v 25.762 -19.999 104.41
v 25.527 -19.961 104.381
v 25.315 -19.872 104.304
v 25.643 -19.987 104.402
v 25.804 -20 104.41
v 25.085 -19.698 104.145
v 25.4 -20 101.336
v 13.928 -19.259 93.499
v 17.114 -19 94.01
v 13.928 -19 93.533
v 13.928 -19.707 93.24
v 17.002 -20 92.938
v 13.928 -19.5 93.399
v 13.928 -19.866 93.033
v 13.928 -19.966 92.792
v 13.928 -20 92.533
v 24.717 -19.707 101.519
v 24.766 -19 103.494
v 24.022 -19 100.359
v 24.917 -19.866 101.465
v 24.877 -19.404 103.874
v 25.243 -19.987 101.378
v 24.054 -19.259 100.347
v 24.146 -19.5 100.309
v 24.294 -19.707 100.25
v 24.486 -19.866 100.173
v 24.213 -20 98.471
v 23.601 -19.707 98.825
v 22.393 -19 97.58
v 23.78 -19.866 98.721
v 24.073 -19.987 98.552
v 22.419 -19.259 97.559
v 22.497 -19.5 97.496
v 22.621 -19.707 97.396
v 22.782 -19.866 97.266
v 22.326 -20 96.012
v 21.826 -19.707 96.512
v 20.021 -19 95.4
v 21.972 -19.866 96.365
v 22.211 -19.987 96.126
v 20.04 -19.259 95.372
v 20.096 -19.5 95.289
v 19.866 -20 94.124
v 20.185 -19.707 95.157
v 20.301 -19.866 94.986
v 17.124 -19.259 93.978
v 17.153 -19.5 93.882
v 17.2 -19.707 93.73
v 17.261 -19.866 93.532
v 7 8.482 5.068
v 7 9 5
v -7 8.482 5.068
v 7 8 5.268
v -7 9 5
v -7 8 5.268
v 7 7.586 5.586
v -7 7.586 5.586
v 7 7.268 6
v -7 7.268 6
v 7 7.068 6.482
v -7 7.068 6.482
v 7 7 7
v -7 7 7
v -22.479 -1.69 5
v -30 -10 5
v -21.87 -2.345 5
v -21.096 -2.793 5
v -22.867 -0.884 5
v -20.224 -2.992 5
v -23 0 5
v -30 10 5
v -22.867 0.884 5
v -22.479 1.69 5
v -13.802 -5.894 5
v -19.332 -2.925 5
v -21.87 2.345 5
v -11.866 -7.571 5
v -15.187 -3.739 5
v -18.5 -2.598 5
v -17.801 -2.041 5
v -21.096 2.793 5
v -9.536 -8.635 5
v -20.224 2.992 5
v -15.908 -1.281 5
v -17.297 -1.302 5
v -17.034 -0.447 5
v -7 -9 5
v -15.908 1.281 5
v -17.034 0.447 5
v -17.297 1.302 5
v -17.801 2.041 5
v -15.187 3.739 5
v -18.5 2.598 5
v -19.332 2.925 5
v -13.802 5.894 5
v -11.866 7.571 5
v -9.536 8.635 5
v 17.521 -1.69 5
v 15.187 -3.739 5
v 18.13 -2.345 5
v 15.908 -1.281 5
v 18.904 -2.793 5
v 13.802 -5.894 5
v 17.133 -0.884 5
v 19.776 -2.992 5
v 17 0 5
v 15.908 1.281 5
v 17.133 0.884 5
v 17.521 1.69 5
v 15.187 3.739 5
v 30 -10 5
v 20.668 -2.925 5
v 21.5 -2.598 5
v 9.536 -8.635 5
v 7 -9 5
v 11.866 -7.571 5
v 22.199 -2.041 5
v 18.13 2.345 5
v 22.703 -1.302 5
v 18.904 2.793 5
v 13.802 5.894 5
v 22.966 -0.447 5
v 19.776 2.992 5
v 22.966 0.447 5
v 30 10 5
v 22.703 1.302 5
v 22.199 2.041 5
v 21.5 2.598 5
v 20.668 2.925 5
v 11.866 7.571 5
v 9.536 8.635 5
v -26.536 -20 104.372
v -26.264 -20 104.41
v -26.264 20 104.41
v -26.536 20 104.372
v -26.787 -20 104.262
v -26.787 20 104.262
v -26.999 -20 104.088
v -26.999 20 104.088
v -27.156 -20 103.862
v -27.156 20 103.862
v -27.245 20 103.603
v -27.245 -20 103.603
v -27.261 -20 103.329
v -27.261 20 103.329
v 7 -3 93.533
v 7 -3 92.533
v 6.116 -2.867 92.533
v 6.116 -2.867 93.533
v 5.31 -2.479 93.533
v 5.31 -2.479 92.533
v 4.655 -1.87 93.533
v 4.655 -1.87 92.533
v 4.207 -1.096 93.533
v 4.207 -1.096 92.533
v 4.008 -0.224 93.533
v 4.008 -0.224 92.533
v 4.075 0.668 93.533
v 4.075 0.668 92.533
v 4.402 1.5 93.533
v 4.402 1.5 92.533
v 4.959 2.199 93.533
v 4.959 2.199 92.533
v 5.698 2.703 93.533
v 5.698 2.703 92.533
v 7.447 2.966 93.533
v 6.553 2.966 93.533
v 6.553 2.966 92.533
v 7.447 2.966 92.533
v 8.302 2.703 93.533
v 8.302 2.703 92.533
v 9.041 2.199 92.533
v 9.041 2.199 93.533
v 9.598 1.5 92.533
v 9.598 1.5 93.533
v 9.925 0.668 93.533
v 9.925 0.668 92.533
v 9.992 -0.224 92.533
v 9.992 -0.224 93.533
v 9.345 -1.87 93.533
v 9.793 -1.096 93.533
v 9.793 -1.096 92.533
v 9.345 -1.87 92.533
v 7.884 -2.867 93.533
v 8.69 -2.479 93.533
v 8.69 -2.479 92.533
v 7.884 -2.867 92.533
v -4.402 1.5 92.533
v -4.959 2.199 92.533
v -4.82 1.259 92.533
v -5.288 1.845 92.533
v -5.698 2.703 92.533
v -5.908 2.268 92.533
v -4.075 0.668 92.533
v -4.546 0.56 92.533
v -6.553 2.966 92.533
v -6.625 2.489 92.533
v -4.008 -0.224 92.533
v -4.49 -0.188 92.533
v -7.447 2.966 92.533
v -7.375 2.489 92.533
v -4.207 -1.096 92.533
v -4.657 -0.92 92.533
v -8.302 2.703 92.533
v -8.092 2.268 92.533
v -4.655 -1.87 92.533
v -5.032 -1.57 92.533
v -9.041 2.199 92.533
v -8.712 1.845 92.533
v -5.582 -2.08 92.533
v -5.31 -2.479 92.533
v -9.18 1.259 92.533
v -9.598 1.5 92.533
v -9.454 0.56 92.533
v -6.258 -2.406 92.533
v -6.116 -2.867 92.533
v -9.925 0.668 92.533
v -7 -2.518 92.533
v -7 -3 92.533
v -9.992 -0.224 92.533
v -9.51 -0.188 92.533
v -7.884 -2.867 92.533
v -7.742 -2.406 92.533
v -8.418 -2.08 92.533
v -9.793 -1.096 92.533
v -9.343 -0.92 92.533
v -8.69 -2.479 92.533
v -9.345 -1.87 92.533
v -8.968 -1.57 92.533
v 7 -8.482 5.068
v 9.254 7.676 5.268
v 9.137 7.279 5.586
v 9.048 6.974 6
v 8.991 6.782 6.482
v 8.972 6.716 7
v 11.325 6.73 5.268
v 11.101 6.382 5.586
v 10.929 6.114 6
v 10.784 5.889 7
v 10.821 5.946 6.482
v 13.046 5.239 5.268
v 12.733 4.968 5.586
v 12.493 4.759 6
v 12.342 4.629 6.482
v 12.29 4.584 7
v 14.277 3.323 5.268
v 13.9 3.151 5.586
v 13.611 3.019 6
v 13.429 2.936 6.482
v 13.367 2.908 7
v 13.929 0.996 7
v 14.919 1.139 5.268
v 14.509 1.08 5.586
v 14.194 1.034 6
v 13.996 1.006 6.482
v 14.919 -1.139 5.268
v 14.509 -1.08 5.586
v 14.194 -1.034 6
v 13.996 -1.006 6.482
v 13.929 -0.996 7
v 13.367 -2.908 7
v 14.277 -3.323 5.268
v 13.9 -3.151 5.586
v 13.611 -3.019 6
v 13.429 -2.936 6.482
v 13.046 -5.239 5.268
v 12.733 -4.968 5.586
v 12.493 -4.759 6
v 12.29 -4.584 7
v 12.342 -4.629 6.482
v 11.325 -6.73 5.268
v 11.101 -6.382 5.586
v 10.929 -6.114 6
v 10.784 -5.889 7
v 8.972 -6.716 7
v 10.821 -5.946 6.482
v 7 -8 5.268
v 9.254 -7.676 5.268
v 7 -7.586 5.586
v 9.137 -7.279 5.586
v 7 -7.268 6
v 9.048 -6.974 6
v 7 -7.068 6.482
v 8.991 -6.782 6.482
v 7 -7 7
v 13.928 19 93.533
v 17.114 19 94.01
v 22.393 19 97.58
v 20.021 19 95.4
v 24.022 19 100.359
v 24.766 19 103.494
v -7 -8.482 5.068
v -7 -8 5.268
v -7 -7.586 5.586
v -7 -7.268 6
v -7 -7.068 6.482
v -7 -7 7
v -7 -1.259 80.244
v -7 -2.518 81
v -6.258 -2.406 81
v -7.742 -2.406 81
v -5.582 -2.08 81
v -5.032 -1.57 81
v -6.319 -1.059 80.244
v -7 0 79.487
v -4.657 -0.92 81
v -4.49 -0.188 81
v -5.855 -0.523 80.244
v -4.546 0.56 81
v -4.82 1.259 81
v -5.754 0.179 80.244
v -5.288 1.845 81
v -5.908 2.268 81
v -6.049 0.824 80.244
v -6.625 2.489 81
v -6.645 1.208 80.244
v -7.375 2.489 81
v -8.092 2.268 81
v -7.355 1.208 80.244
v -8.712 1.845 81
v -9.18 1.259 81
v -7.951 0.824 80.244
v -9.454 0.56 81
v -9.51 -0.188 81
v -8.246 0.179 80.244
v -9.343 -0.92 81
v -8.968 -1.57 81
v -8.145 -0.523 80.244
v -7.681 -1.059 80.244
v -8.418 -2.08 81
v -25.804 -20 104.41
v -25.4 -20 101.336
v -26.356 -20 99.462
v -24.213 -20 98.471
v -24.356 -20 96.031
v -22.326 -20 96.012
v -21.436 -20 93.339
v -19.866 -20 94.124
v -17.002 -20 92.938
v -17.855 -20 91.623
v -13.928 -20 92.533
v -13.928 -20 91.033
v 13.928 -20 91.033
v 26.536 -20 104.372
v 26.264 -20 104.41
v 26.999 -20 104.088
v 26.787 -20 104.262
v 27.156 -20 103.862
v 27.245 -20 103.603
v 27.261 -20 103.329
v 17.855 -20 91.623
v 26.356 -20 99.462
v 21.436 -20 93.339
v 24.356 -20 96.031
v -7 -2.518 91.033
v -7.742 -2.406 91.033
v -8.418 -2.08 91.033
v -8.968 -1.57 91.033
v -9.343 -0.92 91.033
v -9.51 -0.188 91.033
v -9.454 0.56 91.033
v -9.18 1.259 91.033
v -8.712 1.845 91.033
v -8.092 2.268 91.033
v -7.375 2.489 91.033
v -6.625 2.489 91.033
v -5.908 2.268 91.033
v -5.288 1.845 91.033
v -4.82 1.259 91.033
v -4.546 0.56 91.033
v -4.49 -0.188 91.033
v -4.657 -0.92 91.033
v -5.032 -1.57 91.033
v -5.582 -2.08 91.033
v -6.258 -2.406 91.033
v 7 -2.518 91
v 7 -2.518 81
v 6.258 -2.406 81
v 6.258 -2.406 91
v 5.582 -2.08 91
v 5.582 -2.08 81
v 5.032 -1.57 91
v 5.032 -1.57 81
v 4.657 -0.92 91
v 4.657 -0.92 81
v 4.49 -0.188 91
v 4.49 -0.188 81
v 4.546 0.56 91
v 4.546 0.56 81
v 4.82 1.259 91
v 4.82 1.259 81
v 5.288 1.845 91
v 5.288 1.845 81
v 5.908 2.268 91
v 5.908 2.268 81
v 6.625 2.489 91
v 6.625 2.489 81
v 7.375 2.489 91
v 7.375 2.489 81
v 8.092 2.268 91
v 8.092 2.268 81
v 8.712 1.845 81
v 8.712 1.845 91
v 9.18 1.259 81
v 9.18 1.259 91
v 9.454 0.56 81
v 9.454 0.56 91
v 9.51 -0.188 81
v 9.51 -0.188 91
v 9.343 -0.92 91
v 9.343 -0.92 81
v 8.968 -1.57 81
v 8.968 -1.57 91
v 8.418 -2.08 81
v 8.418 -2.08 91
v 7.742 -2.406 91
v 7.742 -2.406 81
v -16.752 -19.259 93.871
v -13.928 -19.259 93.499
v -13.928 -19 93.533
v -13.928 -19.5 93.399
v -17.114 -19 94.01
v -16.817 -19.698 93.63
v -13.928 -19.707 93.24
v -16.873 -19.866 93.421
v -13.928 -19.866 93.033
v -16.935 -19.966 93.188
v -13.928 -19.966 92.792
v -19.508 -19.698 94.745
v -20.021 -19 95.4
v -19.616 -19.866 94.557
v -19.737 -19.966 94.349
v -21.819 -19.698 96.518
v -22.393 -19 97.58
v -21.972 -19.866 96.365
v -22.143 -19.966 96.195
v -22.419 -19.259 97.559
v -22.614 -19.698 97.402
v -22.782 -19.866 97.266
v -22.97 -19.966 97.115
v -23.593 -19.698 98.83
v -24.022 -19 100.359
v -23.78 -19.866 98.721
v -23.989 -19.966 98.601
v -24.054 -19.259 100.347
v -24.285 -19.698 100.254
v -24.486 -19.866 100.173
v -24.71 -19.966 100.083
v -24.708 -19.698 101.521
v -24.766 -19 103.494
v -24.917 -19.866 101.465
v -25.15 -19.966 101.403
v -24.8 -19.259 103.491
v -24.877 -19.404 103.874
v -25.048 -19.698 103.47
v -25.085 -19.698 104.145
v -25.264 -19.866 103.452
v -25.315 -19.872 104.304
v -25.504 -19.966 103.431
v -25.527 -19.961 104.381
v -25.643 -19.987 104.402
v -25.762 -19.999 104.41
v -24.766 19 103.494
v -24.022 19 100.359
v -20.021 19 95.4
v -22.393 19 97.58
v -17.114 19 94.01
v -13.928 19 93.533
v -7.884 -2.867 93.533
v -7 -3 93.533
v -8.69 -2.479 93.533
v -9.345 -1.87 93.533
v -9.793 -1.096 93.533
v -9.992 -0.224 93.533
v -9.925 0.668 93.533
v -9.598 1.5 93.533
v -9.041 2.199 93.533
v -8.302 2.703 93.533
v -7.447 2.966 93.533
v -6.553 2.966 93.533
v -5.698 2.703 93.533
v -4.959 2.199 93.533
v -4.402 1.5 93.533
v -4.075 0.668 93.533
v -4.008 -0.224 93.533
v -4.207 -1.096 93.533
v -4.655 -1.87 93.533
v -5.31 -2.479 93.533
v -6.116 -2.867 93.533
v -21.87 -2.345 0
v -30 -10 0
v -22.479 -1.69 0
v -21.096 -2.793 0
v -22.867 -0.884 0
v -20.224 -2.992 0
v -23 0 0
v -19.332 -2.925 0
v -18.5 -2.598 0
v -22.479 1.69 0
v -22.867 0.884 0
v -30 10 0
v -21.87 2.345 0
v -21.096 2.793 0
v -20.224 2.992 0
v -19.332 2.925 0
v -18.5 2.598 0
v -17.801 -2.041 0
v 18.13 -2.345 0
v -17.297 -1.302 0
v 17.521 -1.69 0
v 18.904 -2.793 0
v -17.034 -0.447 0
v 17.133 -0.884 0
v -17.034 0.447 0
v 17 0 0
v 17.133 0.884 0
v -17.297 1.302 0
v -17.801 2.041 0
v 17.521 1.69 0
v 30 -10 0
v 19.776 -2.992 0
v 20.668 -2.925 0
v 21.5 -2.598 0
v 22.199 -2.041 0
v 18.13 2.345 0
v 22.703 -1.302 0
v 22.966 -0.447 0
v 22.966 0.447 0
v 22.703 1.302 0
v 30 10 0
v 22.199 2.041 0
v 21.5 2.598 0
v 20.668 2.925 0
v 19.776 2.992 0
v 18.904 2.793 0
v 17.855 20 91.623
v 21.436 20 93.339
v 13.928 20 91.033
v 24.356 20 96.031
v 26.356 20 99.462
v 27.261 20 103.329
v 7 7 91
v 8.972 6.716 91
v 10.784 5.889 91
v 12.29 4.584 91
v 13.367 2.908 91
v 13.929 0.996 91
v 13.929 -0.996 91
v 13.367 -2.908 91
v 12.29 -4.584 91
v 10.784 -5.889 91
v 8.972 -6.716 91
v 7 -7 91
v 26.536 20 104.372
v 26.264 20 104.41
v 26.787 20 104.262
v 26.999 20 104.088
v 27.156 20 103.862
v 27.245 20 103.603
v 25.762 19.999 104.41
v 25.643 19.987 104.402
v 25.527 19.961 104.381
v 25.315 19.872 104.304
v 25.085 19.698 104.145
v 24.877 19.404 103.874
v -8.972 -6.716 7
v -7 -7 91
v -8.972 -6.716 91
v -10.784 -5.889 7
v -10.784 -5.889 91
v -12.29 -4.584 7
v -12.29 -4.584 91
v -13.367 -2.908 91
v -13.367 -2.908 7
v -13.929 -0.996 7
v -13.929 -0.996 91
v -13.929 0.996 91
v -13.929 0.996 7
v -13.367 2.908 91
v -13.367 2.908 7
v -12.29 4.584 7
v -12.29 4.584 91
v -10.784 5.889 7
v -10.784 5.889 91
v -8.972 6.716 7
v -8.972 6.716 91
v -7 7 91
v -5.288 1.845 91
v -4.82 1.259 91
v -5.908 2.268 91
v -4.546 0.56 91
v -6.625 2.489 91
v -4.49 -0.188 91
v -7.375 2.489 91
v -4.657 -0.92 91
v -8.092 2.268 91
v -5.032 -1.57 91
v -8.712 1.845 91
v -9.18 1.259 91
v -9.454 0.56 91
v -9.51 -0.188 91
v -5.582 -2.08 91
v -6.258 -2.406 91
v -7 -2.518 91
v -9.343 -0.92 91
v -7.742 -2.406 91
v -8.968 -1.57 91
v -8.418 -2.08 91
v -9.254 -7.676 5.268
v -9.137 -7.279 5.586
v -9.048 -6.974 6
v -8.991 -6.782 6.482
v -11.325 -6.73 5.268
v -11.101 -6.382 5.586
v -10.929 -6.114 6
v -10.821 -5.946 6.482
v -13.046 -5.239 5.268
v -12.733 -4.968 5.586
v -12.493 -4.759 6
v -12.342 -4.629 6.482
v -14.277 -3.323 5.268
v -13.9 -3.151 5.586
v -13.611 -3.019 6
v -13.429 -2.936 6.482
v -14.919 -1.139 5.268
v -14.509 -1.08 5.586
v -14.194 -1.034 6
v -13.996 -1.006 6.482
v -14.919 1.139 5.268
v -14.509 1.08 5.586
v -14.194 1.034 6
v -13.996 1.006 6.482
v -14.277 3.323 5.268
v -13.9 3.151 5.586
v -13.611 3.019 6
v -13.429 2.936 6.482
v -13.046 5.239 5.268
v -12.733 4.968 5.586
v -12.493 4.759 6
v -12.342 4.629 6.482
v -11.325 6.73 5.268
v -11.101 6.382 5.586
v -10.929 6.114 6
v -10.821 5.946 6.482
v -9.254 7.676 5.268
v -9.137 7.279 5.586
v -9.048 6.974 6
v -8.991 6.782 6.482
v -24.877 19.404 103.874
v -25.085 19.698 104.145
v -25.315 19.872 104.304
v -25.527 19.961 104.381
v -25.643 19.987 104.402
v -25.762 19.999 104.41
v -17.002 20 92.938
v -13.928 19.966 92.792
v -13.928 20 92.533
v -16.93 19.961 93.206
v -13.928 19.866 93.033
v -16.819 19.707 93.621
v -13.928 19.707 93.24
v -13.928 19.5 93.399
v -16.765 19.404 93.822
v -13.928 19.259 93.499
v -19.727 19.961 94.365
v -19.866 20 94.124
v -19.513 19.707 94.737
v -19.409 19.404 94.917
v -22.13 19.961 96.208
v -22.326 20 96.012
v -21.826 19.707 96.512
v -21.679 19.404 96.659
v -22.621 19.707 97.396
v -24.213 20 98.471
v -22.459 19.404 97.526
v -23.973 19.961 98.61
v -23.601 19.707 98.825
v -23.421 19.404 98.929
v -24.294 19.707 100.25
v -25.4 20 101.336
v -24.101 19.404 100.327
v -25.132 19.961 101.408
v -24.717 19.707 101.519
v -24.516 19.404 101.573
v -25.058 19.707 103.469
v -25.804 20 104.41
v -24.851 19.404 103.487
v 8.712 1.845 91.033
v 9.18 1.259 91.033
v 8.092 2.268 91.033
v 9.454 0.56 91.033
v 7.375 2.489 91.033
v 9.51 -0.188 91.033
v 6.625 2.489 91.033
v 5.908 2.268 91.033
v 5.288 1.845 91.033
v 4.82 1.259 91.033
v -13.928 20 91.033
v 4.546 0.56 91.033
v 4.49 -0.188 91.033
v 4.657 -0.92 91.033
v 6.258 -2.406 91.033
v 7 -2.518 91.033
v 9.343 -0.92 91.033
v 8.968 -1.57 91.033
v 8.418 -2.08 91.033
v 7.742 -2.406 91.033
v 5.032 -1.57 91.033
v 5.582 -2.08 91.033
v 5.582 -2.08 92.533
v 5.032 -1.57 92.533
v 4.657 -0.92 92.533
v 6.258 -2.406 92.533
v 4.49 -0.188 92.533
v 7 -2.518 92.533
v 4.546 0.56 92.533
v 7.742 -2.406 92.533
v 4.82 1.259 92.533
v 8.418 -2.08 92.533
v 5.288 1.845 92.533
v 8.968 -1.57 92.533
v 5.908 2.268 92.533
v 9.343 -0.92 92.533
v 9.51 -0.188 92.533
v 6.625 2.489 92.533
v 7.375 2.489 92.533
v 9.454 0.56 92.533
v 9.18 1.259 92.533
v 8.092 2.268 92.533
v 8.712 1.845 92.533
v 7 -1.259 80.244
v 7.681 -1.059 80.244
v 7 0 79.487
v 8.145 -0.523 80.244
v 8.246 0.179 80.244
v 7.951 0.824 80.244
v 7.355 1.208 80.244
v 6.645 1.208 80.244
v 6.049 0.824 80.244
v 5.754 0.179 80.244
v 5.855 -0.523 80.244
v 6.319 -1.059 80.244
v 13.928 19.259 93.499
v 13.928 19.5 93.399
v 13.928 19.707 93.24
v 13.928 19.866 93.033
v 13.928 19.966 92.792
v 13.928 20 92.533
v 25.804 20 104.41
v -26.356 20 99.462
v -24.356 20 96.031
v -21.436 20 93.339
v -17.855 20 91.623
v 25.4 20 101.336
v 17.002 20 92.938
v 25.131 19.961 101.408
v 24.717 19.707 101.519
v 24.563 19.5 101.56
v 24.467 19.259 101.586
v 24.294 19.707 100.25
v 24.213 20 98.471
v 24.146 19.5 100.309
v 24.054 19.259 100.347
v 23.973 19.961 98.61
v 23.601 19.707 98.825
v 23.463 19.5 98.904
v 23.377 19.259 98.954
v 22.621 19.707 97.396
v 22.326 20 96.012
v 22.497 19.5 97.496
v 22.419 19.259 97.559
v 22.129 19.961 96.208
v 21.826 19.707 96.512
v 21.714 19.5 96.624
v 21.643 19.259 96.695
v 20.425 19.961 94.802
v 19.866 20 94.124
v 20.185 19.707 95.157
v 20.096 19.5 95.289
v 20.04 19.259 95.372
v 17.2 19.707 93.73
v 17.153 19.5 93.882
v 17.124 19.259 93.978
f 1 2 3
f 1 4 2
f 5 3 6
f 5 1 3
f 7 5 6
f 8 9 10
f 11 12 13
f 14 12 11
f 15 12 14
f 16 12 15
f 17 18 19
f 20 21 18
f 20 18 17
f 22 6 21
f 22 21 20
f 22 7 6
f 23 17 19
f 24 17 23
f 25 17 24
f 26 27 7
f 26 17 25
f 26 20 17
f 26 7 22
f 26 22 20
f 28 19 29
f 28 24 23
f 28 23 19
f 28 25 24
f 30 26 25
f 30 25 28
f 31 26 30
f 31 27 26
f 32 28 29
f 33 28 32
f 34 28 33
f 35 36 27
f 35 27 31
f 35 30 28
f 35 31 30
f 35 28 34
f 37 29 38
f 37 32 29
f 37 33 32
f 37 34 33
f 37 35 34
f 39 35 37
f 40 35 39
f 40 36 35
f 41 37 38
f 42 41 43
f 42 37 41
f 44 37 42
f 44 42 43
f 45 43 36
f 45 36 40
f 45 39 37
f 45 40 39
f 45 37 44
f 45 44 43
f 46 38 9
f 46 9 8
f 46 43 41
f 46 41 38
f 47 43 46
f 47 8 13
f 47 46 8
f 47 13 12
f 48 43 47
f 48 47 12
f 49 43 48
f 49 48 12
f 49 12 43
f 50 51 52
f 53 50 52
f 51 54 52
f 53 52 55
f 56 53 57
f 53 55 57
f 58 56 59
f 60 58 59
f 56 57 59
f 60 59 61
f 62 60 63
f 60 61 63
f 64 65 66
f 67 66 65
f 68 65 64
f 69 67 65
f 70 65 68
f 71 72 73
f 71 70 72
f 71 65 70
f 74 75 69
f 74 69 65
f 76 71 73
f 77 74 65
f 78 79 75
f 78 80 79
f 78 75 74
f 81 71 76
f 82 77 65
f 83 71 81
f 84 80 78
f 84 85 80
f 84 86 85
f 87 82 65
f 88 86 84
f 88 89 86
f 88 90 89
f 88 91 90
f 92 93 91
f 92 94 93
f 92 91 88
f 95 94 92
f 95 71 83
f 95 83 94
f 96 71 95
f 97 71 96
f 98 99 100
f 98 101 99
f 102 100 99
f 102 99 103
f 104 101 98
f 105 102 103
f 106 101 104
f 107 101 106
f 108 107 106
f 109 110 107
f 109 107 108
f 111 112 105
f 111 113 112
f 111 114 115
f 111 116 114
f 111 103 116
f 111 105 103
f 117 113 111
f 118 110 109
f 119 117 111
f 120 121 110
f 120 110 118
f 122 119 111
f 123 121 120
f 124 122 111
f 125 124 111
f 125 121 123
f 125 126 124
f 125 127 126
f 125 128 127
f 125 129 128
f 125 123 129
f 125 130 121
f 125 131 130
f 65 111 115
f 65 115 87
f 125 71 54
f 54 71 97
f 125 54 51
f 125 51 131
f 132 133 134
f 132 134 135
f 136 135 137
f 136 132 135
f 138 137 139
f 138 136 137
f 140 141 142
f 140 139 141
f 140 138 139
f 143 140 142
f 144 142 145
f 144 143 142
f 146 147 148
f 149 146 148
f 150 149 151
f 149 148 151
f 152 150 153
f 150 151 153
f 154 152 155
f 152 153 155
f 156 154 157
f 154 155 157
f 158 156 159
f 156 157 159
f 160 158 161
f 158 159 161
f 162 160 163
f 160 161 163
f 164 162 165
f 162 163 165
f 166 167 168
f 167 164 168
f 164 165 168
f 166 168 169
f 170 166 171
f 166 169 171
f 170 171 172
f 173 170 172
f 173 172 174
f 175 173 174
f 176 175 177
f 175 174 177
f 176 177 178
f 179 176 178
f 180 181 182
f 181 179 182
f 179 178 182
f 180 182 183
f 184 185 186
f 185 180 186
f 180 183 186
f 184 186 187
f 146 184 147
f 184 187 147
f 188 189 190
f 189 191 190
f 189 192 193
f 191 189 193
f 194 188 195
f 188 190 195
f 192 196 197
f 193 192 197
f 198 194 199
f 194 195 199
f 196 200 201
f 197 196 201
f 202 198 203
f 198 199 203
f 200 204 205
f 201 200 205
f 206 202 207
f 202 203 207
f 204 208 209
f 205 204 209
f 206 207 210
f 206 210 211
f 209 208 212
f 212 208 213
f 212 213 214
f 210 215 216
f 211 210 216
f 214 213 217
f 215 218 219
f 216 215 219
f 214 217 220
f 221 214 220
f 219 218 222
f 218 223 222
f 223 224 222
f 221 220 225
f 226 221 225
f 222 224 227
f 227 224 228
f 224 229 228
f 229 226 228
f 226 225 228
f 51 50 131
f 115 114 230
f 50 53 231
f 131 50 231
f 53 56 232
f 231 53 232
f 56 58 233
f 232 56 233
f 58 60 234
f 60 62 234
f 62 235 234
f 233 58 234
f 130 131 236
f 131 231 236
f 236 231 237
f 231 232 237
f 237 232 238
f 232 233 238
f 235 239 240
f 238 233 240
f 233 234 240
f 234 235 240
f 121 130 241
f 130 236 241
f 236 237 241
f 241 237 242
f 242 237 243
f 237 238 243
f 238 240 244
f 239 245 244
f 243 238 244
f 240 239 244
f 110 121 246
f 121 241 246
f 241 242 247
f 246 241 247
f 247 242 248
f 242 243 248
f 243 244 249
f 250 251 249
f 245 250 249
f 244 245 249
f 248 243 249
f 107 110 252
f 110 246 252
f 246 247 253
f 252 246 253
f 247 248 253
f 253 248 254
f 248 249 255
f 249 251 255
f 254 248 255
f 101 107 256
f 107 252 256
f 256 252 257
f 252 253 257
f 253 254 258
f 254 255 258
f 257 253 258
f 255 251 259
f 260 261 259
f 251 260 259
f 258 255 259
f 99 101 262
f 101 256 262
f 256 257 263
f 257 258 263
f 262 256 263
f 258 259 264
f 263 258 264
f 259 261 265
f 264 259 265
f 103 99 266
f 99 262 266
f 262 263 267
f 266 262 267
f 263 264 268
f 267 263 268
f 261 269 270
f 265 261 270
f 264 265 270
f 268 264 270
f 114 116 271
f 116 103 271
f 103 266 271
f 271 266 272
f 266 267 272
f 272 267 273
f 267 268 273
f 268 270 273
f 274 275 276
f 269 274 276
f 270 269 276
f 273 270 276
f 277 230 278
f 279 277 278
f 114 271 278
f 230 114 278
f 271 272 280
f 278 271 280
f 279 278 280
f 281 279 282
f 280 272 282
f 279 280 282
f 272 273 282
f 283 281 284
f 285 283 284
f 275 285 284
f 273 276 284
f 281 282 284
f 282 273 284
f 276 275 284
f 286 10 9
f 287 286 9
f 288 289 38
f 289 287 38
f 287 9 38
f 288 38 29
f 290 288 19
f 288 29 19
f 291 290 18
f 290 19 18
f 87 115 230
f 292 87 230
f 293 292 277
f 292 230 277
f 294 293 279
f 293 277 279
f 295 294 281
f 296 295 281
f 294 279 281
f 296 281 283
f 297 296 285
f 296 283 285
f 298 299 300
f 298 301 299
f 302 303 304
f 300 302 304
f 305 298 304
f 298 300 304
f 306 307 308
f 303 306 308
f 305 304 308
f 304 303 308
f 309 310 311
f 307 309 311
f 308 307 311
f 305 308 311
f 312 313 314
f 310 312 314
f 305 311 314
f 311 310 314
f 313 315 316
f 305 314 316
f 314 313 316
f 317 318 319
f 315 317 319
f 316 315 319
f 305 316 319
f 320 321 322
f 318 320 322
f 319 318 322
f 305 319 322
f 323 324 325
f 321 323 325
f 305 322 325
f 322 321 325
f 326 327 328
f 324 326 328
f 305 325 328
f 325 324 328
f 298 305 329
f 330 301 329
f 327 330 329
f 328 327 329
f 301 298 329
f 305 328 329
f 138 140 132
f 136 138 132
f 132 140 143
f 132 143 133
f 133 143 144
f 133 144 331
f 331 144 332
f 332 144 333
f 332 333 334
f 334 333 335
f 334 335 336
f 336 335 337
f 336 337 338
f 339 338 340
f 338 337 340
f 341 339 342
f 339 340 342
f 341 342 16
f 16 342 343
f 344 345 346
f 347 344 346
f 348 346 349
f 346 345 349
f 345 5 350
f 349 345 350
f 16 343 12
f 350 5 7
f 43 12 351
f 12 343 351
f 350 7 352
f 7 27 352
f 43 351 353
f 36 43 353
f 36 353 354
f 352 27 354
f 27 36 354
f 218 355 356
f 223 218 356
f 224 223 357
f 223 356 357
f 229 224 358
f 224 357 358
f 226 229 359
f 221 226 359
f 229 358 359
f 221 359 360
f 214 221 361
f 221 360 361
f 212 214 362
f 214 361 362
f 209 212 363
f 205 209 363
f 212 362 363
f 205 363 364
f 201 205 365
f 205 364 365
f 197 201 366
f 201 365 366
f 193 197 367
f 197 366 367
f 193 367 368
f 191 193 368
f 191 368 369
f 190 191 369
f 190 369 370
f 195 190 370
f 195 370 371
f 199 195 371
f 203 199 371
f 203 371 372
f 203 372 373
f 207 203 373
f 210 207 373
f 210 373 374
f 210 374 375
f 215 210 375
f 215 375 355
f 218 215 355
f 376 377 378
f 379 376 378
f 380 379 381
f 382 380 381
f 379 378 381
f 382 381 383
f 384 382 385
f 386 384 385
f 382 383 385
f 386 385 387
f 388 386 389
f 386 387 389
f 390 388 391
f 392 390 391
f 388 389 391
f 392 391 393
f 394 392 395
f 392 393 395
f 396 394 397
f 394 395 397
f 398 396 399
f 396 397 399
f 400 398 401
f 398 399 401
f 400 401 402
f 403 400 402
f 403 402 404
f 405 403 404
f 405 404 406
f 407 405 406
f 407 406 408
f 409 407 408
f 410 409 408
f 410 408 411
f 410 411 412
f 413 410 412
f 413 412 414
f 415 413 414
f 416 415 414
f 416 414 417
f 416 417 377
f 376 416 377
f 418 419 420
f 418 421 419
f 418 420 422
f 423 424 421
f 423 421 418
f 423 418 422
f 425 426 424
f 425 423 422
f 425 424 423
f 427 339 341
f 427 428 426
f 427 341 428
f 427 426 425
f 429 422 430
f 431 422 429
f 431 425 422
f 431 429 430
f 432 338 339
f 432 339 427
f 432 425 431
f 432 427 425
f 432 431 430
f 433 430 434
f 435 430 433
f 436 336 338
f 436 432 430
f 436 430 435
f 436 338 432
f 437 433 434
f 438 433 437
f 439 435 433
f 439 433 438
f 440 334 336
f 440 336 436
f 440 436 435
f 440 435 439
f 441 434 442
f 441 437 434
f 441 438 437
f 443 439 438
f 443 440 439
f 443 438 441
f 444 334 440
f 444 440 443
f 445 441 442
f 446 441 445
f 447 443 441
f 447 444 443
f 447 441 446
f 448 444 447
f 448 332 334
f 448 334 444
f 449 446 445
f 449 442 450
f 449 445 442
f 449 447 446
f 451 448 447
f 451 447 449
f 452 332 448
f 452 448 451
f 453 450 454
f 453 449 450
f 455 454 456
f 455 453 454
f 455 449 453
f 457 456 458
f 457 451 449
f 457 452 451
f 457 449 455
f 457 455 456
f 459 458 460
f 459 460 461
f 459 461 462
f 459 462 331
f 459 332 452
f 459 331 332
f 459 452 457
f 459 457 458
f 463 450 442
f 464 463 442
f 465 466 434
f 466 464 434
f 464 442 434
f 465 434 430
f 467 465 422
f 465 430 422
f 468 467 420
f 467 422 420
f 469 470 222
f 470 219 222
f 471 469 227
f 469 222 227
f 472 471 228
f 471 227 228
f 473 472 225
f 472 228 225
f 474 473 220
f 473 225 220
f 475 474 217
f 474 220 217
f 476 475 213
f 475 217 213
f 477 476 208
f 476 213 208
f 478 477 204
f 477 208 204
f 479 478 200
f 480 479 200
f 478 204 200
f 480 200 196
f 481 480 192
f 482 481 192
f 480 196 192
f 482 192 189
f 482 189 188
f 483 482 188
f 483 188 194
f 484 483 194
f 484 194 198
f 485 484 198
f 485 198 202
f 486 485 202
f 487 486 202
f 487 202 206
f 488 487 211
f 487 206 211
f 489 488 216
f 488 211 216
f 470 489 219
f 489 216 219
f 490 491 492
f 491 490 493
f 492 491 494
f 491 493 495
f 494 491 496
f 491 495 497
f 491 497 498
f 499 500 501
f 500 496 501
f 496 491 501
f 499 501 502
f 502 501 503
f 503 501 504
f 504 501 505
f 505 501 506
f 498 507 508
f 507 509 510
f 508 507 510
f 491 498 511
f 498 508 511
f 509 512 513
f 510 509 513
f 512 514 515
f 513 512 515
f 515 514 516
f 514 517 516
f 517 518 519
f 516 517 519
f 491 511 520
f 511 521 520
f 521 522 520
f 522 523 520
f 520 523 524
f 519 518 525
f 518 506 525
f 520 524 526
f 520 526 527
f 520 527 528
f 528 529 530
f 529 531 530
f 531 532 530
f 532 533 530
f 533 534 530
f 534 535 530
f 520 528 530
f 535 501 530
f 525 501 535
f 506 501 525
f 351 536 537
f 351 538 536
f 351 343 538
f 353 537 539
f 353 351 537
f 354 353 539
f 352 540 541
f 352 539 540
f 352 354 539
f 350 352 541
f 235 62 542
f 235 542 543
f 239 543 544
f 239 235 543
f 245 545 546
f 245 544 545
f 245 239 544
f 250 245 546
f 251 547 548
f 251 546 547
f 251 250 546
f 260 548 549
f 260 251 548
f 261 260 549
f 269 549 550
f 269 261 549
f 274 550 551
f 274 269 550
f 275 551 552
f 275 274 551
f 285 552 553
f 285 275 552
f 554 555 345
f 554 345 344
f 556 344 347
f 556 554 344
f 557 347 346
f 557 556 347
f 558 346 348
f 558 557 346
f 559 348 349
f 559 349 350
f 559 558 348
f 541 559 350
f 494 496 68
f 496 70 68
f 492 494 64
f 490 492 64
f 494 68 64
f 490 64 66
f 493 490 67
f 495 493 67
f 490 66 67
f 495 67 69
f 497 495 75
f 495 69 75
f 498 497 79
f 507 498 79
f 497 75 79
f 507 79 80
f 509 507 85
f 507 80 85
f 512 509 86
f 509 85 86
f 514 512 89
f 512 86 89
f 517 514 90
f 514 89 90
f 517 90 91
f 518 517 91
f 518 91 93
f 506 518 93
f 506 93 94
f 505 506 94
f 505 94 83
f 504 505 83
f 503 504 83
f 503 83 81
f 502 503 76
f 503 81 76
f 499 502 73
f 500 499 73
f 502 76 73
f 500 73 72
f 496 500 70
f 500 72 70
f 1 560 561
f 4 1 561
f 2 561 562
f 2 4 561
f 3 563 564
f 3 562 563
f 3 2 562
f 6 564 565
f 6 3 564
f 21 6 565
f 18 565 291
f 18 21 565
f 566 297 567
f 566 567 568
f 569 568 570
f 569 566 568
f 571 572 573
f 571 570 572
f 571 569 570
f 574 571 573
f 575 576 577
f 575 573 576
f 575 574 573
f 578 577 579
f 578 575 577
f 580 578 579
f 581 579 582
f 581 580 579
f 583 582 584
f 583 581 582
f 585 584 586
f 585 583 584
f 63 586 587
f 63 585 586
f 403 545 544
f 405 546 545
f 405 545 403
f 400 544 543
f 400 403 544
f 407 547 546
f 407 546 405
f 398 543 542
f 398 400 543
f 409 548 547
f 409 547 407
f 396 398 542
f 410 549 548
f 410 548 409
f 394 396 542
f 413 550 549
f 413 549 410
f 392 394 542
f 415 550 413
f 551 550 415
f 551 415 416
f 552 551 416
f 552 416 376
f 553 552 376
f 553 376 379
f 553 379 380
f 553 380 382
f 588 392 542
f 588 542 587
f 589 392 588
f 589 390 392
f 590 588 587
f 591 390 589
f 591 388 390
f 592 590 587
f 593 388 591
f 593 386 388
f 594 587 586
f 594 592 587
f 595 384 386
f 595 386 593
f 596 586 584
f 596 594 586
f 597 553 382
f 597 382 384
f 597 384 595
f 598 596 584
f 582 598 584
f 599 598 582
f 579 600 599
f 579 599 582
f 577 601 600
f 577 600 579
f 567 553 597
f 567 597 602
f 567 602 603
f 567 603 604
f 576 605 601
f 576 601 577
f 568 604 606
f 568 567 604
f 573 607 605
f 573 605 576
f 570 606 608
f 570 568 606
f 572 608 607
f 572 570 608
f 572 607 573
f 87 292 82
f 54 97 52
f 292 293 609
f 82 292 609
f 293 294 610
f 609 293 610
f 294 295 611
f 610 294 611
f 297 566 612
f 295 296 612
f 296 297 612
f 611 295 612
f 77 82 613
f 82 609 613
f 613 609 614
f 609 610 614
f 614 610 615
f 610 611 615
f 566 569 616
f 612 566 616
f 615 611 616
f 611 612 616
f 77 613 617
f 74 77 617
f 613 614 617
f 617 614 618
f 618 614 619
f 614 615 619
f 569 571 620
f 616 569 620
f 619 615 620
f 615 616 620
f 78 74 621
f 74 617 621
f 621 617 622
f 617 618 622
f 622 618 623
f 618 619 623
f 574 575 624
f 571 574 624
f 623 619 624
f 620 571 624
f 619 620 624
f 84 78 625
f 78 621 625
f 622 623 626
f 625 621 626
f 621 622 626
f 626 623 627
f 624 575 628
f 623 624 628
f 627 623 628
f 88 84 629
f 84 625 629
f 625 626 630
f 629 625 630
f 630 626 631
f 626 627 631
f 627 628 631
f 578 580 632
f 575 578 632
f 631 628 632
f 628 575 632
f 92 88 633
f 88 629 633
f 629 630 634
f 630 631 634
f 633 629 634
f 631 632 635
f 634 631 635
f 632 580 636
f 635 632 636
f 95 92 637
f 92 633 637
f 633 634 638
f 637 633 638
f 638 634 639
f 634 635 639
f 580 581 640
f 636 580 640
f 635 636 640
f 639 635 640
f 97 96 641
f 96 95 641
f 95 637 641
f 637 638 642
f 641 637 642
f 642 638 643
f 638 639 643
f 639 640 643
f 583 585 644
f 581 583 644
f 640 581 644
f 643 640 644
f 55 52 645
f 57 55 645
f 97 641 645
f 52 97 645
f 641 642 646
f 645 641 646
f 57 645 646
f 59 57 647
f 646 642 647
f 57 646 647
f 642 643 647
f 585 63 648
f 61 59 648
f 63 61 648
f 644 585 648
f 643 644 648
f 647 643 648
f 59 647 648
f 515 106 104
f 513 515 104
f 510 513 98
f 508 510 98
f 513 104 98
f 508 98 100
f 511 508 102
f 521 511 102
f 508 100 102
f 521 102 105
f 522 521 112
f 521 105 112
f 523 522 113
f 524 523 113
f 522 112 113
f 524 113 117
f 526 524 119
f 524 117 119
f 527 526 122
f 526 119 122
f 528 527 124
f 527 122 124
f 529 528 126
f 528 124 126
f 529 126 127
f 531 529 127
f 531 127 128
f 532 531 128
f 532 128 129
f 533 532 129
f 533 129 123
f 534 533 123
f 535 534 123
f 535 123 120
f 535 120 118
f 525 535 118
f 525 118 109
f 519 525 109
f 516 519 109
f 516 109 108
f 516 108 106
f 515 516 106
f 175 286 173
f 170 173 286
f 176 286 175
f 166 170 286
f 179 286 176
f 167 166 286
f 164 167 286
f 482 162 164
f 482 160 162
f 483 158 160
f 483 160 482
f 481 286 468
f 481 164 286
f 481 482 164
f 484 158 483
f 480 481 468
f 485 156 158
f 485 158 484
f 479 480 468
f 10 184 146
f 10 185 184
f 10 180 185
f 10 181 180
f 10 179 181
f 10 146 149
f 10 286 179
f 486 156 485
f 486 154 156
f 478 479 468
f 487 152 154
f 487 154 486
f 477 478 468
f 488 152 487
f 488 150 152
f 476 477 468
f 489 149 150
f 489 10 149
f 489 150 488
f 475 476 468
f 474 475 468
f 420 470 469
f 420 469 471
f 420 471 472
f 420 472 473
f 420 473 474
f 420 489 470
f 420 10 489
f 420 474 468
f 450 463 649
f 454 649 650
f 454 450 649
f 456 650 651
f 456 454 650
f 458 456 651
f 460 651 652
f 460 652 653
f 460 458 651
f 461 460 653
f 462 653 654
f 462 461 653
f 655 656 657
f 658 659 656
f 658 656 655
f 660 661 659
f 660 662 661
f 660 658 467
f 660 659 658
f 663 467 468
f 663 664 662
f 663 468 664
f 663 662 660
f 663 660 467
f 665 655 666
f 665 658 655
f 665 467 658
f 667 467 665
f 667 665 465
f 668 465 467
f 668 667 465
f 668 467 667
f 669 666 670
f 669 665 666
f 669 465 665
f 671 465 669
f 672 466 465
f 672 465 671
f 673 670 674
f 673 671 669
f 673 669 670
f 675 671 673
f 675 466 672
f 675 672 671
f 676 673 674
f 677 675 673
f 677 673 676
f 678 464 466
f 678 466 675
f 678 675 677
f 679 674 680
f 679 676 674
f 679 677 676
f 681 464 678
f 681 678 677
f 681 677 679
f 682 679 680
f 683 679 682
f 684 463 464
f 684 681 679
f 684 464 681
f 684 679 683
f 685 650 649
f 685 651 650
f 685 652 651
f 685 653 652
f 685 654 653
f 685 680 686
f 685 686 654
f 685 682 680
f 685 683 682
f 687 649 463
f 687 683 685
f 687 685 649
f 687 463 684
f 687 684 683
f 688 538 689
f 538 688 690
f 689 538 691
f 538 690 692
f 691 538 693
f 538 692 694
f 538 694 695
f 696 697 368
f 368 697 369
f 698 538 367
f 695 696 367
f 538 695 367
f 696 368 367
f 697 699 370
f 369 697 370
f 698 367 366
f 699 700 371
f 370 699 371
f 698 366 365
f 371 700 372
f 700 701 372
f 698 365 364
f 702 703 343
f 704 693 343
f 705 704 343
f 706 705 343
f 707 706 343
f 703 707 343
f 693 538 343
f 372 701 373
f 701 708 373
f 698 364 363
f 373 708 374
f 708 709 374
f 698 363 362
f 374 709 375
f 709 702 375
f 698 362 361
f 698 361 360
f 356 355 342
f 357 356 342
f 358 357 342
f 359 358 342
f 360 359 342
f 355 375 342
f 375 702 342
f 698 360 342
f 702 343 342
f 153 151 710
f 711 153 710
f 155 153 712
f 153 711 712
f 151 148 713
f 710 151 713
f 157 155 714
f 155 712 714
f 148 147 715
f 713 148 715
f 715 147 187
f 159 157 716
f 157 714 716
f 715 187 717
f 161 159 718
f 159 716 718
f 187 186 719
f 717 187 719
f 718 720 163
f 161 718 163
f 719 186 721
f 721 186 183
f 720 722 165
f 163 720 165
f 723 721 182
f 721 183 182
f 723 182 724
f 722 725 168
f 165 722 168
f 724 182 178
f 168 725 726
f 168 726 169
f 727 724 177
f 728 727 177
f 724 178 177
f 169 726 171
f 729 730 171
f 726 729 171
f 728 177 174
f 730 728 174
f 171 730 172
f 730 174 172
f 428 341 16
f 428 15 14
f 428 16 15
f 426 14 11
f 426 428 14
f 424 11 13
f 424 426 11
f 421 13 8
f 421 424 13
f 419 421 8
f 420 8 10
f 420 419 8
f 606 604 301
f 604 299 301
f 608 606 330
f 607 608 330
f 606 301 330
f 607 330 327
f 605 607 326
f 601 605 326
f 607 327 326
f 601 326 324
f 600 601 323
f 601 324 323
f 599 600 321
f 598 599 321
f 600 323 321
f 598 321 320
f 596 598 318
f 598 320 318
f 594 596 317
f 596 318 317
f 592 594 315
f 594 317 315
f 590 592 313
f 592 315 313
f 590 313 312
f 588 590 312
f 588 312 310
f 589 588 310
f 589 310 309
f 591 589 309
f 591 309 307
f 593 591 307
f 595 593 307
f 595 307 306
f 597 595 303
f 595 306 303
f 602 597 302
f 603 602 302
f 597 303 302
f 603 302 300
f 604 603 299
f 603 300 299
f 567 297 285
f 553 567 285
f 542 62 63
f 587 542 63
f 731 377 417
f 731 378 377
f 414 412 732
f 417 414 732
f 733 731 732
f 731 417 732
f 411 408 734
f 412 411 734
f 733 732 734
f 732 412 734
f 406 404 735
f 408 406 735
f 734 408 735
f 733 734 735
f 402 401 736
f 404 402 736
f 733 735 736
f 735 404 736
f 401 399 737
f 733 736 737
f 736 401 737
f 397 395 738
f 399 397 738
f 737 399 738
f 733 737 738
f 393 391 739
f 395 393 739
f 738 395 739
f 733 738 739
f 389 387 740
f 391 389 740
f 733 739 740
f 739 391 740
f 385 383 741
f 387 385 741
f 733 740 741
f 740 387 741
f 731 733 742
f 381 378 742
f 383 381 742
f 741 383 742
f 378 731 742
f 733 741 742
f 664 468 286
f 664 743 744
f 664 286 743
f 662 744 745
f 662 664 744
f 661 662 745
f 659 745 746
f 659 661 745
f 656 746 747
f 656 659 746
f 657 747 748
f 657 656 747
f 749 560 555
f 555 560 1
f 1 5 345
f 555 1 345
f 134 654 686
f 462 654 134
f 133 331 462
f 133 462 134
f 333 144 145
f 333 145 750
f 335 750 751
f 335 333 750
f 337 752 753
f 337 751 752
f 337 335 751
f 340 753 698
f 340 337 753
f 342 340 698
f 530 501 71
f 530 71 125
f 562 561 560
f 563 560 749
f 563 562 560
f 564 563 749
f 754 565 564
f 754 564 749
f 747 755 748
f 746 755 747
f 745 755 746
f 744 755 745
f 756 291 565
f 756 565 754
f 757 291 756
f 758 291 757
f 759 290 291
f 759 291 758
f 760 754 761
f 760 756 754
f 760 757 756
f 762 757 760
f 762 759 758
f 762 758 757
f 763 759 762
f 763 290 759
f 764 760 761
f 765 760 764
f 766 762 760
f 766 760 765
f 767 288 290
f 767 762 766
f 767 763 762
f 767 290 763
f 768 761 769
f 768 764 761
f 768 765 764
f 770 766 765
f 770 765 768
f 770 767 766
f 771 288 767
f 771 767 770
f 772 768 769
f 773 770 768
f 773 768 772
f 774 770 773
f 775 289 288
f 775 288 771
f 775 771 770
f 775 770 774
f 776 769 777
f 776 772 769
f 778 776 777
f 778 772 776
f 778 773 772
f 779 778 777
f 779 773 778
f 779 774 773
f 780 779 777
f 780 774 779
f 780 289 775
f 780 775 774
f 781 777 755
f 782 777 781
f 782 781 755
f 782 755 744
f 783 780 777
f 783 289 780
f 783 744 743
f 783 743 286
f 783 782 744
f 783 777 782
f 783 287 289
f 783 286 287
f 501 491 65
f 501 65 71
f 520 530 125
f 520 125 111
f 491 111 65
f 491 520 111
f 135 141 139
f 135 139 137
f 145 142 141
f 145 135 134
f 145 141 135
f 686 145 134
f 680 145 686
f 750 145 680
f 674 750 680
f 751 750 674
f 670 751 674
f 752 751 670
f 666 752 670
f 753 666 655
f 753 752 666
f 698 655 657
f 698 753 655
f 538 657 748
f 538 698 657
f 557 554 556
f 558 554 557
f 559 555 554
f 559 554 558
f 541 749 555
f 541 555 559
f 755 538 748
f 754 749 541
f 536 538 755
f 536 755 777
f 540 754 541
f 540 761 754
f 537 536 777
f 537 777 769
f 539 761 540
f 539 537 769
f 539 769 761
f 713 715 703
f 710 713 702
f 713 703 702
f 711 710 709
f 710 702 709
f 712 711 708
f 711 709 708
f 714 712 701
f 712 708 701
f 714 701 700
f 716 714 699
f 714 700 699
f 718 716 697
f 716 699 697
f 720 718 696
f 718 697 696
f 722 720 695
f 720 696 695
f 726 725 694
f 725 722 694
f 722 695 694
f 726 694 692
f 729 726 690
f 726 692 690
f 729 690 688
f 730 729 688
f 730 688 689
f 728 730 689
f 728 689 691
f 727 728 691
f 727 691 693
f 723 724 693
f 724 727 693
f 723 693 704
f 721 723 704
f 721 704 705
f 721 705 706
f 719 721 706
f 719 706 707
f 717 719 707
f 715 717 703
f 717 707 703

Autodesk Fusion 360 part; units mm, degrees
sketch "Boceto1" plane through (0, 0, 0) normal (0, 0, 1) x (1, 0, 0)
  line L0 (-30, 10) -> (30, 10)
  line L1 (30, 10) -> (30, -10)
  line L2 (30, -10) -> (-30, -10)
  line L3 (-30, -10) -> (-30, 10)
  point P0 (0, 10)
  point P1 (-30, 0)
  dimension "d1" = 60
  dimension "d2" = 20
extrude "Extruir1" add sketch "Boceto1" along normal blind 5 makes body 1
sketch "Boceto2" plane through (0, 0, 5) normal (0, 0, 1) x (-1, 0, 0)
  line L0 (30, 10) -> (-30, 10)
  line L1 (-30, 10) -> (-30, -10)
  line L2 (-30, -10) -> (30, -10)
  line L3 (30, -10) -> (30, 10)
  line L4 (7, 7) -> (-7, 7)
  arc A0 (-7, 7) -> (-7, -7) centre (-7, 0) ccw
  line L5 (-7, -7) -> (7, -7)
  arc A1 (7, -7) -> (7, 7) centre (7, 0) ccw
  line L6 (7, 0) -> (-7, 0) construction
  dimension "d30" = 14
  dimension "d31" = 7
extrude "Extruir2" add sketch "Boceto2" along normal blind 86 contours L4 A0 L5 A1 bodies 1
sketch "Boceto3" plane through (0, 0, 0) normal (0, 1, 0) x (1, 0, 0)
  arc A0 (27.3044, -104.4096) -> (13.9281, -91.0333) centre (13.9281, -104.4096) ccw
  line L0 (13.9281, -91.0333) -> (-13.9281, -91.0333)
  arc A1 (-13.9281, -91.0333) -> (-27.3044, -104.4096) centre (-13.9281, -104.4096) ccw
  line L1 (-13.9281, -104.4096) -> (13.9281, -104.4096) construction
  arc A2 (24.8044, -104.4096) -> (13.9281, -93.5333) centre (13.9281, -104.4096) ccw
  line L2 (13.9281, -93.5333) -> (-13.9281, -93.5333)
  arc A3 (-13.9281, -93.5333) -> (-24.8044, -104.4096) centre (-13.9281, -104.4096) ccw
  line L3 (-13.9281, -104.4096) -> (13.9281, -104.4096) construction
  line L4 (-24.8044, -104.4096) -> (-27.3044, -104.4096)
  line L5 (24.8044, -104.4096) -> (27.3044, -104.4096)
  point P0 (0, -104.4096)
extrude "Extruir3" add sketch "Boceto3" along normal blind 20 and the other way blind 20 separate body makes body 2
fillet "Empalme1" radius 2 4 edges at (14, 0, 5) (0, -7, 5) (-14, 0, 5) (0, 7, 5) on bodies 1
sketch "Boceto4" plane through (0, 0, 5) normal (0, 0, 1) x (-1, 0, 0)
  line L0 (30, 10) -> (-30, 10)
  line L1 (-30, 10) -> (-30, -10)
  line L2 (-30, -10) -> (30, -10)
  line L3 (30, -10) -> (30, 10)
  circle A0 centre (20, 0) radius 3
  circle A1 centre (-20, 0) radius 3
  arc A2 (-7, 9) -> (-7, -9) centre (-7, 0) ccw
  line L4 (-7, 9) -> (7, 9)
  arc A3 (7, -9) -> (7, 9) centre (7, 0) ccw
  line L5 (7, -9) -> (-7, -9)
  dimension "d16" = 6
  dimension "d17" = 6
  dimension "d18" = 40
extrude "Extruir4" cut sketch "Boceto4" against normal blind 10 contours A0 | A1 bodies 1
hole "Agujero1" at (7, 0, 91) direction (0, 0, -1) diameter 5.035 depth 10 tip angle 118 bodies 1
hole "Agujero2" at (-7, 0, 91) direction (0, 0, -1) diameter 5.035 depth 10 tip angle 118 bodies 1
fillet "Empalme2" radius 1 8 edges at (-24.8044, 0, 104.4096) (21.6188, -20, 96.7189) (0, -20, 93.5333) (-21.6188, -20, 96.7189) (-21.6188, 20, 96.7189) (0, 20, 93.5333) (21.6188, 20, 96.7189) (24.8044, 0, 104.4096) on bodies 2
fillet "Empalme3" radius 1 2 edges at (-27.3044, 0, 104.4096) (27.3044, 0, 104.4096) on bodies 2
hole "Agujero3" at (-7, 0, 93.5333) direction (0, 0, -1) diameter 5.035 depth 10 tip angle 118 counterbore diameter 6 counterbore depth 1 bodies 2
mirror "Simetría1" about plane through (0, 0, 0) normal (1, 0, 0) of "Agujero3"
